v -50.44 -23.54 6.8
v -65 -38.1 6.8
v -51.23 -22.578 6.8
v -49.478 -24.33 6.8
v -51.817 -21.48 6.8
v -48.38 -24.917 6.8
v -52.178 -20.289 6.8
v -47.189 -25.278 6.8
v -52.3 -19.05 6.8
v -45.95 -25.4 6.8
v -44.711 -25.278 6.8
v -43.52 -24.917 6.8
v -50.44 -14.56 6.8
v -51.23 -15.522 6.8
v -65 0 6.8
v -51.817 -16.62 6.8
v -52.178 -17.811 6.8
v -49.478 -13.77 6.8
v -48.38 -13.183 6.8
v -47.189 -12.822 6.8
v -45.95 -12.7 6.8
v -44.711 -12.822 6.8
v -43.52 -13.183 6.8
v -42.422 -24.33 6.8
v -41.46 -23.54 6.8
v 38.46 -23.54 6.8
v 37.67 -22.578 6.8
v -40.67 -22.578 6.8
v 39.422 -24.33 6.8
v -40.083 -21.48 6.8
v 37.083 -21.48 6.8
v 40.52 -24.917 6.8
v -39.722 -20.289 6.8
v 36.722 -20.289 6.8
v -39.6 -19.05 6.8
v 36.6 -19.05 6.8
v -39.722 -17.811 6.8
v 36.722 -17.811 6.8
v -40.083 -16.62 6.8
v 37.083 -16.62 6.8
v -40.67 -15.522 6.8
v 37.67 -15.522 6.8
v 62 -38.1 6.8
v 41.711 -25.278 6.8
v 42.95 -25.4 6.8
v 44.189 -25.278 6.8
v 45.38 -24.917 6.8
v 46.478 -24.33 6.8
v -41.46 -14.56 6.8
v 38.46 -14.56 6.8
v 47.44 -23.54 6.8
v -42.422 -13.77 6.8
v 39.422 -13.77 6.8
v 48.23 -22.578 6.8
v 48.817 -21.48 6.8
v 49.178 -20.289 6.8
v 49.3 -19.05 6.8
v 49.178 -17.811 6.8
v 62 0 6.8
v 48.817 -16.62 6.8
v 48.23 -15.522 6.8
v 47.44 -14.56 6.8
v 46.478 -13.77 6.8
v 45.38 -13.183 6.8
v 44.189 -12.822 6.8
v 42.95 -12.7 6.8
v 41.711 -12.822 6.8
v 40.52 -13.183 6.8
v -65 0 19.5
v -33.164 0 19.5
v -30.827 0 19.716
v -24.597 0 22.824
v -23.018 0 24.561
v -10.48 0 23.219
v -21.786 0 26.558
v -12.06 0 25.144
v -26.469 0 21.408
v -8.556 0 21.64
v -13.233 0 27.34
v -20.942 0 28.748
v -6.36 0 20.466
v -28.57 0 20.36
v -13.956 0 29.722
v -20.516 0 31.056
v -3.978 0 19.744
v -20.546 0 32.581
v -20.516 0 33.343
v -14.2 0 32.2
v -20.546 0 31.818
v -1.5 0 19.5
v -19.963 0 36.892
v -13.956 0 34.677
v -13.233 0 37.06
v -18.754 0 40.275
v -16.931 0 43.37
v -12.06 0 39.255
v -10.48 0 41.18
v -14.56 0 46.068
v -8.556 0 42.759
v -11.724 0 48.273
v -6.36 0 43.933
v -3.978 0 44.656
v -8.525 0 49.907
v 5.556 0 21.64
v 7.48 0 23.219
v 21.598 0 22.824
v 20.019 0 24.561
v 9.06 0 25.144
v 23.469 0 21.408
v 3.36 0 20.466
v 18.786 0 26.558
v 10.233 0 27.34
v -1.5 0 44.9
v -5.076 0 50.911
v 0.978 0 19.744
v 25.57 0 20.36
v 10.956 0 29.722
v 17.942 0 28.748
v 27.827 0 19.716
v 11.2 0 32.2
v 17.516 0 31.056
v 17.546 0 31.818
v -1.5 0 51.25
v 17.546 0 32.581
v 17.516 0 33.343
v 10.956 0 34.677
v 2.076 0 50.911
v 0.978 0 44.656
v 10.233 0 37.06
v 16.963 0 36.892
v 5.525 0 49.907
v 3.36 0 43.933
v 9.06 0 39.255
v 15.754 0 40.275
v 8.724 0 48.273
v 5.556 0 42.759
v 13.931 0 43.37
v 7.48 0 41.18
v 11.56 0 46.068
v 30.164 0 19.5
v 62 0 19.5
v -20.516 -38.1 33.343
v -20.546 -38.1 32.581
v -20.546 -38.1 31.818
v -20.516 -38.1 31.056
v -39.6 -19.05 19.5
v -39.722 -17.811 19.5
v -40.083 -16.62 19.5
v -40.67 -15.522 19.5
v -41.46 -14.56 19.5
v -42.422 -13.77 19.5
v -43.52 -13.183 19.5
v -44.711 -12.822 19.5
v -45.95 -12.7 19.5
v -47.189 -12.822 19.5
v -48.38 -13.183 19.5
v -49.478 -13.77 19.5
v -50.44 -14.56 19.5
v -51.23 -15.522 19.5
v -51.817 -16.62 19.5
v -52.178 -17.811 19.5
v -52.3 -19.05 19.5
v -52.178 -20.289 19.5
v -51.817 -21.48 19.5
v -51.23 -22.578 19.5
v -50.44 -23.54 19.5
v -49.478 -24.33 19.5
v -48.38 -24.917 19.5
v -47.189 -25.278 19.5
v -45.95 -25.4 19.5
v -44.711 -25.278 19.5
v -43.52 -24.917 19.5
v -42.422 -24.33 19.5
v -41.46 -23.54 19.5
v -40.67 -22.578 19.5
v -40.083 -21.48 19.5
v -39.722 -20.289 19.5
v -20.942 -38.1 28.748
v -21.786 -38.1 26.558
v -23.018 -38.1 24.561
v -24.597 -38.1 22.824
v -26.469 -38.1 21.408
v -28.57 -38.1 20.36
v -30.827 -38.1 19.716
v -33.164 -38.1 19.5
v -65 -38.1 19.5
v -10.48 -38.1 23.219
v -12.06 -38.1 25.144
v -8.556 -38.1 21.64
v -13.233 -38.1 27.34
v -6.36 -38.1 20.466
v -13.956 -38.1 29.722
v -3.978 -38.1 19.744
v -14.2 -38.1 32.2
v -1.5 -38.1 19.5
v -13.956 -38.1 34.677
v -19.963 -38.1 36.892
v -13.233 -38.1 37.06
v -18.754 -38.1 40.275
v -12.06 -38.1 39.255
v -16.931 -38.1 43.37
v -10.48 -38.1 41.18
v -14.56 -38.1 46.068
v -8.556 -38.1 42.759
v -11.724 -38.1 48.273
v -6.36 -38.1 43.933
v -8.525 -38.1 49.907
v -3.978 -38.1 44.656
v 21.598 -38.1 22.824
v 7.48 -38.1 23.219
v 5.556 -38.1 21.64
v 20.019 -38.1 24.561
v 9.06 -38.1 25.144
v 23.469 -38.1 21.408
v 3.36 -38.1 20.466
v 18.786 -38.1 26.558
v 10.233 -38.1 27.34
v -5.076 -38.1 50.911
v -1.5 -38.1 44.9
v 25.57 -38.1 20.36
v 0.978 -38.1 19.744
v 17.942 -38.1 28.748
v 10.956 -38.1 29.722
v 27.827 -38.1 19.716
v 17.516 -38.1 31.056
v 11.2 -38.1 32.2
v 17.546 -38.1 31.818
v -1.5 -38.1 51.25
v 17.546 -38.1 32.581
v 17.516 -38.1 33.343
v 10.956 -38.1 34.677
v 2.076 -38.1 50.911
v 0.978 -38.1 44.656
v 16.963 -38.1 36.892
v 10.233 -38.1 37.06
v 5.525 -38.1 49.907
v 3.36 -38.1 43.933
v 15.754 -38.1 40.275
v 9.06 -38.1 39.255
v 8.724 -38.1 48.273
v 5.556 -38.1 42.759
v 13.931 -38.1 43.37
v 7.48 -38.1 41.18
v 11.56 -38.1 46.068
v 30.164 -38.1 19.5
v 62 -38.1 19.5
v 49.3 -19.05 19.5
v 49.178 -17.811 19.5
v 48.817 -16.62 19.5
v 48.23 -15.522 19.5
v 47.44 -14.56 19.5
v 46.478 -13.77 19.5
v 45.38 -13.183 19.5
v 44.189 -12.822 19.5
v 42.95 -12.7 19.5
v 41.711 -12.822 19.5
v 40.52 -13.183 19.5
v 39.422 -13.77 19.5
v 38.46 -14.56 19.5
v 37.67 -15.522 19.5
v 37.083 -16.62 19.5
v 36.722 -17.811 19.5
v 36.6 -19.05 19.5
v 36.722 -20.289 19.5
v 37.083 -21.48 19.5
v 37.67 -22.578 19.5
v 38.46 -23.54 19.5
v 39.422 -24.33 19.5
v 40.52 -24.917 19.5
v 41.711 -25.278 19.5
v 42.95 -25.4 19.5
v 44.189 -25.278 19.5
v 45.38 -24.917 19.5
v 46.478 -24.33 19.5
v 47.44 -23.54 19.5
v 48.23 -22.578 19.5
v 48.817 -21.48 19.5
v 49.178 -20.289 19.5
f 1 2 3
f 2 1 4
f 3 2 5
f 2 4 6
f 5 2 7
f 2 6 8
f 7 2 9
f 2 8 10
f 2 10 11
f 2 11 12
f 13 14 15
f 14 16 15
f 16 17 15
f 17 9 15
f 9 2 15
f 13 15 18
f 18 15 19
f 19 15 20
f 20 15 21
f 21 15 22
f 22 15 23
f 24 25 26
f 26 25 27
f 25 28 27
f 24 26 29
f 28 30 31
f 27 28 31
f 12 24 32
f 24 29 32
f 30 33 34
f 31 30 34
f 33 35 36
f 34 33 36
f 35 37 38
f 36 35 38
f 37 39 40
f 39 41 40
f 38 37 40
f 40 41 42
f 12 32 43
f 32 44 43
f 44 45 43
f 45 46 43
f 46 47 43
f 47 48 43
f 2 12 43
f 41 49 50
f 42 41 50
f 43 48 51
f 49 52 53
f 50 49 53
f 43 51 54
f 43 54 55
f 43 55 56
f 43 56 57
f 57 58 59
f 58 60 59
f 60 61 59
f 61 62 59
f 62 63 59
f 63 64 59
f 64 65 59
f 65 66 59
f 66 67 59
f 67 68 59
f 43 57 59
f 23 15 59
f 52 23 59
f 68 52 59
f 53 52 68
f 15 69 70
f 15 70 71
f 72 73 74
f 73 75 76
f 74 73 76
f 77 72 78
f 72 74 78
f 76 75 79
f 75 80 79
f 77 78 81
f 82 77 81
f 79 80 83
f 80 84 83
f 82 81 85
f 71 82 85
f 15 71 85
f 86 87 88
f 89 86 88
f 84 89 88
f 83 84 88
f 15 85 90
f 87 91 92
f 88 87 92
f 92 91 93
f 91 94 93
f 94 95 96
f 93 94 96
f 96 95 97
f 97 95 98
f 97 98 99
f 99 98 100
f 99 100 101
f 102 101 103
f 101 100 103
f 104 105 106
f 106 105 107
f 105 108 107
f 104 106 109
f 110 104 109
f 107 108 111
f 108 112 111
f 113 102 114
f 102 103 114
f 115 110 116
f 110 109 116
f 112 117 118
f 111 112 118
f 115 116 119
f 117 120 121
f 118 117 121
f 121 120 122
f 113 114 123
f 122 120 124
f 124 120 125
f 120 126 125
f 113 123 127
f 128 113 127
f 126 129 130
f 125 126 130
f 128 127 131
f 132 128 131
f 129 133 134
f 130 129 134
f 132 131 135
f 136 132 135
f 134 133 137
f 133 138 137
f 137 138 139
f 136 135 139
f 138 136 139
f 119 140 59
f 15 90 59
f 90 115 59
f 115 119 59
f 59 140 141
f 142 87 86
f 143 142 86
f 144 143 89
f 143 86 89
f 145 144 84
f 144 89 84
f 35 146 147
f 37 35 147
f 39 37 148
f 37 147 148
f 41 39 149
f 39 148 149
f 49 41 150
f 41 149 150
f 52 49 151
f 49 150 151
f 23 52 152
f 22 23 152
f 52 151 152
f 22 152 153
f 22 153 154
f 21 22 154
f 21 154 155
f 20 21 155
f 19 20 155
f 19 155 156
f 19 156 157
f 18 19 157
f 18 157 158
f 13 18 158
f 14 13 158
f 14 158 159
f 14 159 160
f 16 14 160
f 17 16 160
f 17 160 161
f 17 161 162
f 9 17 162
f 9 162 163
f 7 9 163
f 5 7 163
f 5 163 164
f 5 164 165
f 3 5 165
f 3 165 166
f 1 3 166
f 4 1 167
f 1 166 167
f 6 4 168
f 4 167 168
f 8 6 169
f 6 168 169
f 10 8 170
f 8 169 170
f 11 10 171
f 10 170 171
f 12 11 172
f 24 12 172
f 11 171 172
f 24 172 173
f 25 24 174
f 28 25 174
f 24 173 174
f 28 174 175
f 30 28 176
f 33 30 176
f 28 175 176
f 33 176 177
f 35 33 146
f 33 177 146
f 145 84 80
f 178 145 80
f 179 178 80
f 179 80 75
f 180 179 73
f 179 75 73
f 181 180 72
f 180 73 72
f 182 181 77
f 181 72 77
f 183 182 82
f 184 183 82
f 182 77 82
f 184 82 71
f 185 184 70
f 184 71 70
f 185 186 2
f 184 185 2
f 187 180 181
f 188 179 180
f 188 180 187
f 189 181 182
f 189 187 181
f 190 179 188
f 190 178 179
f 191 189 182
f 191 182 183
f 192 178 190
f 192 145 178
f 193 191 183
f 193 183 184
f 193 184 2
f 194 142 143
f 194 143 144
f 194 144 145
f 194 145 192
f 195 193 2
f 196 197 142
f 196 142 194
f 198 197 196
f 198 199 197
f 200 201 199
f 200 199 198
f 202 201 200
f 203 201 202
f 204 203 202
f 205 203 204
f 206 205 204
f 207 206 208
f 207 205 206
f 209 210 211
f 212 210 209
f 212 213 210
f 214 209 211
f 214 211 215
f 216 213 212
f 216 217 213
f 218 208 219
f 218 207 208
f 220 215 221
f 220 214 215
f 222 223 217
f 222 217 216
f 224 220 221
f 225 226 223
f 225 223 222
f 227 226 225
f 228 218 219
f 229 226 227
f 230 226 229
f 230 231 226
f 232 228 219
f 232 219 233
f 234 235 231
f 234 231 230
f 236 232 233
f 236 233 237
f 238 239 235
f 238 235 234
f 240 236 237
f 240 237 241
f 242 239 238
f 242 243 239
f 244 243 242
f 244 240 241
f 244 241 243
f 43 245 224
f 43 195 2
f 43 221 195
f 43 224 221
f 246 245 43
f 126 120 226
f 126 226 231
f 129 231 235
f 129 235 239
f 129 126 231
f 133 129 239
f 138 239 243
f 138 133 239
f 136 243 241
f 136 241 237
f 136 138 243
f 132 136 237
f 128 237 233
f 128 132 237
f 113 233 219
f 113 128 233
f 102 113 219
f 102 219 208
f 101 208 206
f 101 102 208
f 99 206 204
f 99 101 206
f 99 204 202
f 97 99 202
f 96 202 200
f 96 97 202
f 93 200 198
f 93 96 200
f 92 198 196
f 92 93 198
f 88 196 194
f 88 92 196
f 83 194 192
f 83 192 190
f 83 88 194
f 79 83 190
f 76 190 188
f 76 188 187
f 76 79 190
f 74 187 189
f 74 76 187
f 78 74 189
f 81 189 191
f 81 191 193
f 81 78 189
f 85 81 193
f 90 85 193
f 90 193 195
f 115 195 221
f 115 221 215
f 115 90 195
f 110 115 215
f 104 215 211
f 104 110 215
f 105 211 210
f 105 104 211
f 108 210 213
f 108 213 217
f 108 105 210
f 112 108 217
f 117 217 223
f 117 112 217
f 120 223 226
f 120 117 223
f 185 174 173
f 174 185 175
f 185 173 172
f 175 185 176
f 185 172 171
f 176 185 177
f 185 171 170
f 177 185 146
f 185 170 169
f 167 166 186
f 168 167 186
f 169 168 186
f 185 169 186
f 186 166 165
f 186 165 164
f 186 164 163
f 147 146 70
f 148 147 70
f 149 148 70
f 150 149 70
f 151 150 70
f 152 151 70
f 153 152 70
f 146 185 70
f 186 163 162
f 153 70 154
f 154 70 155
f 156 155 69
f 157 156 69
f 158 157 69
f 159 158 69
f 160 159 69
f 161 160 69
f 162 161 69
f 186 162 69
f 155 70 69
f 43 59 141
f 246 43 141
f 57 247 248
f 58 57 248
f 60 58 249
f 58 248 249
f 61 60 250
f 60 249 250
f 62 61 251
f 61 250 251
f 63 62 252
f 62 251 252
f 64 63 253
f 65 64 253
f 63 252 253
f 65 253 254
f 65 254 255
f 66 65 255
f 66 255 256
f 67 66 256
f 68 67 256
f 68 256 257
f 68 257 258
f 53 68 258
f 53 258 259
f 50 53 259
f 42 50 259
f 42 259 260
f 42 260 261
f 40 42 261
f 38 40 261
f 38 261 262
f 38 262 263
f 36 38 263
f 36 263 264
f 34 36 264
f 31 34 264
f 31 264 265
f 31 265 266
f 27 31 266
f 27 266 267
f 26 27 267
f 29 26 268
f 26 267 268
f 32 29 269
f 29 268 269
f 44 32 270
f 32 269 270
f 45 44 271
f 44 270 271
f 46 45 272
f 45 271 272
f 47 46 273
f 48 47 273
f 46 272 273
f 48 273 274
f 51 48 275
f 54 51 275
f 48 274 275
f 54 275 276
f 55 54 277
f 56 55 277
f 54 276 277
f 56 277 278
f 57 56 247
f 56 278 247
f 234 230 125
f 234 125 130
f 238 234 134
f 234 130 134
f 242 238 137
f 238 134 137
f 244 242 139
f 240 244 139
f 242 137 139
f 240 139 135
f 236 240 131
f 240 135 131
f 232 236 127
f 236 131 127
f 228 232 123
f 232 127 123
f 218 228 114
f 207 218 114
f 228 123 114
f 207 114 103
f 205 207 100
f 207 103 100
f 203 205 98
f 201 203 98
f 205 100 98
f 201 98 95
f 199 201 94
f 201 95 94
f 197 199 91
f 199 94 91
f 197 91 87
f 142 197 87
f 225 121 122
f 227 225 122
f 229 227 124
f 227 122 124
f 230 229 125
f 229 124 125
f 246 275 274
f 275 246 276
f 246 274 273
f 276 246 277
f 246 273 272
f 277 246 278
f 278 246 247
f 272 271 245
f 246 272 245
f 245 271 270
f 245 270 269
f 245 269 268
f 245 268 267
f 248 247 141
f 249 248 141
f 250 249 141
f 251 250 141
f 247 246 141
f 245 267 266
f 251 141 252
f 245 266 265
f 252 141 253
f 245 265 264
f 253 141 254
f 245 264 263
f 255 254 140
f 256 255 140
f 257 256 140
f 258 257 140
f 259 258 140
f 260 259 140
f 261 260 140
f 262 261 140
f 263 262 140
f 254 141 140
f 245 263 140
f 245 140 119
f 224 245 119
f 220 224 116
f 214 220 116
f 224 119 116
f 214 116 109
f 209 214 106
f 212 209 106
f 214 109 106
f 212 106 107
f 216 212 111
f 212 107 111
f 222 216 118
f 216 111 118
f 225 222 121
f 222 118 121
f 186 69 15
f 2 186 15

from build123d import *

# Parameters (mm, degrees)
F0_R     = 12.7
F1_DEPTH = 38.1
F2_R     = 6.35
F3_DEPTH = 12.701


with BuildPart() as f1:
    # F0 (on Front) → F1 (new body)
    with BuildSketch(Plane.XZ):
        with BuildLine():
            Line((-33.163997, 19.499587), (-64.999874, 19.499587))
            Line((-64.999874, 19.499587), (-64.999874, 6.799587))
            Line((-64.999874, 6.799587), (62.000126, 6.799587))
            Line((62.000126, 6.799587), (62.000126, 19.499587))
            Line((62.000126, 19.499587), (30.164248, 19.499587))
            ThreePointArc((30.164248, 19.499587), (21.597672, 22.823886), (17.515798, 31.056474))
            ThreePointArc((17.515798, 31.056474), (17.464248, 32.199587), (17.515798, 33.3427))
            ThreePointArc((17.515798, 33.3427), (-1.499874, 51.249587), (-20.515546, 33.3427))
            ThreePointArc((-20.515546, 33.3427), (-20.463997, 32.199587), (-20.515546, 31.056474))
            ThreePointArc((-20.515546, 31.056474), (-24.59742, 22.823886), (-33.163997, 19.499587))
        make_face()
        with Locations((-1.499874, 32.199587)):
            Circle(F0_R, mode=Mode.SUBTRACT)
        with BuildLine():
            ThreePointArc((-20.515546, 33.3427), (-20.549874, 32.199587), (-20.515546, 31.056474))
            ThreePointArc((-20.515546, 31.056474), (-20.463997, 32.199587), (-20.515546, 33.3427))
        make_face()
        with BuildLine():
            ThreePointArc((17.515798, 31.056474), (17.550126, 32.199587), (17.515798, 33.3427))
            ThreePointArc((17.515798, 33.3427), (17.464248, 32.199587), (17.515798, 31.056474))
        make_face()
    extrude(amount=F1_DEPTH)

    # F2 (on face) → F3 (cut, through all)
    with BuildSketch(Plane.XY.offset(19.499587)):
        with Locations((42.950126, -19.05)):
            Circle(F2_R)
        with Locations((-45.949874, -19.05)):
            Circle(F2_R)
    extrude(amount=-F3_DEPTH, mode=Mode.SUBTRACT)


solid = f1.part
